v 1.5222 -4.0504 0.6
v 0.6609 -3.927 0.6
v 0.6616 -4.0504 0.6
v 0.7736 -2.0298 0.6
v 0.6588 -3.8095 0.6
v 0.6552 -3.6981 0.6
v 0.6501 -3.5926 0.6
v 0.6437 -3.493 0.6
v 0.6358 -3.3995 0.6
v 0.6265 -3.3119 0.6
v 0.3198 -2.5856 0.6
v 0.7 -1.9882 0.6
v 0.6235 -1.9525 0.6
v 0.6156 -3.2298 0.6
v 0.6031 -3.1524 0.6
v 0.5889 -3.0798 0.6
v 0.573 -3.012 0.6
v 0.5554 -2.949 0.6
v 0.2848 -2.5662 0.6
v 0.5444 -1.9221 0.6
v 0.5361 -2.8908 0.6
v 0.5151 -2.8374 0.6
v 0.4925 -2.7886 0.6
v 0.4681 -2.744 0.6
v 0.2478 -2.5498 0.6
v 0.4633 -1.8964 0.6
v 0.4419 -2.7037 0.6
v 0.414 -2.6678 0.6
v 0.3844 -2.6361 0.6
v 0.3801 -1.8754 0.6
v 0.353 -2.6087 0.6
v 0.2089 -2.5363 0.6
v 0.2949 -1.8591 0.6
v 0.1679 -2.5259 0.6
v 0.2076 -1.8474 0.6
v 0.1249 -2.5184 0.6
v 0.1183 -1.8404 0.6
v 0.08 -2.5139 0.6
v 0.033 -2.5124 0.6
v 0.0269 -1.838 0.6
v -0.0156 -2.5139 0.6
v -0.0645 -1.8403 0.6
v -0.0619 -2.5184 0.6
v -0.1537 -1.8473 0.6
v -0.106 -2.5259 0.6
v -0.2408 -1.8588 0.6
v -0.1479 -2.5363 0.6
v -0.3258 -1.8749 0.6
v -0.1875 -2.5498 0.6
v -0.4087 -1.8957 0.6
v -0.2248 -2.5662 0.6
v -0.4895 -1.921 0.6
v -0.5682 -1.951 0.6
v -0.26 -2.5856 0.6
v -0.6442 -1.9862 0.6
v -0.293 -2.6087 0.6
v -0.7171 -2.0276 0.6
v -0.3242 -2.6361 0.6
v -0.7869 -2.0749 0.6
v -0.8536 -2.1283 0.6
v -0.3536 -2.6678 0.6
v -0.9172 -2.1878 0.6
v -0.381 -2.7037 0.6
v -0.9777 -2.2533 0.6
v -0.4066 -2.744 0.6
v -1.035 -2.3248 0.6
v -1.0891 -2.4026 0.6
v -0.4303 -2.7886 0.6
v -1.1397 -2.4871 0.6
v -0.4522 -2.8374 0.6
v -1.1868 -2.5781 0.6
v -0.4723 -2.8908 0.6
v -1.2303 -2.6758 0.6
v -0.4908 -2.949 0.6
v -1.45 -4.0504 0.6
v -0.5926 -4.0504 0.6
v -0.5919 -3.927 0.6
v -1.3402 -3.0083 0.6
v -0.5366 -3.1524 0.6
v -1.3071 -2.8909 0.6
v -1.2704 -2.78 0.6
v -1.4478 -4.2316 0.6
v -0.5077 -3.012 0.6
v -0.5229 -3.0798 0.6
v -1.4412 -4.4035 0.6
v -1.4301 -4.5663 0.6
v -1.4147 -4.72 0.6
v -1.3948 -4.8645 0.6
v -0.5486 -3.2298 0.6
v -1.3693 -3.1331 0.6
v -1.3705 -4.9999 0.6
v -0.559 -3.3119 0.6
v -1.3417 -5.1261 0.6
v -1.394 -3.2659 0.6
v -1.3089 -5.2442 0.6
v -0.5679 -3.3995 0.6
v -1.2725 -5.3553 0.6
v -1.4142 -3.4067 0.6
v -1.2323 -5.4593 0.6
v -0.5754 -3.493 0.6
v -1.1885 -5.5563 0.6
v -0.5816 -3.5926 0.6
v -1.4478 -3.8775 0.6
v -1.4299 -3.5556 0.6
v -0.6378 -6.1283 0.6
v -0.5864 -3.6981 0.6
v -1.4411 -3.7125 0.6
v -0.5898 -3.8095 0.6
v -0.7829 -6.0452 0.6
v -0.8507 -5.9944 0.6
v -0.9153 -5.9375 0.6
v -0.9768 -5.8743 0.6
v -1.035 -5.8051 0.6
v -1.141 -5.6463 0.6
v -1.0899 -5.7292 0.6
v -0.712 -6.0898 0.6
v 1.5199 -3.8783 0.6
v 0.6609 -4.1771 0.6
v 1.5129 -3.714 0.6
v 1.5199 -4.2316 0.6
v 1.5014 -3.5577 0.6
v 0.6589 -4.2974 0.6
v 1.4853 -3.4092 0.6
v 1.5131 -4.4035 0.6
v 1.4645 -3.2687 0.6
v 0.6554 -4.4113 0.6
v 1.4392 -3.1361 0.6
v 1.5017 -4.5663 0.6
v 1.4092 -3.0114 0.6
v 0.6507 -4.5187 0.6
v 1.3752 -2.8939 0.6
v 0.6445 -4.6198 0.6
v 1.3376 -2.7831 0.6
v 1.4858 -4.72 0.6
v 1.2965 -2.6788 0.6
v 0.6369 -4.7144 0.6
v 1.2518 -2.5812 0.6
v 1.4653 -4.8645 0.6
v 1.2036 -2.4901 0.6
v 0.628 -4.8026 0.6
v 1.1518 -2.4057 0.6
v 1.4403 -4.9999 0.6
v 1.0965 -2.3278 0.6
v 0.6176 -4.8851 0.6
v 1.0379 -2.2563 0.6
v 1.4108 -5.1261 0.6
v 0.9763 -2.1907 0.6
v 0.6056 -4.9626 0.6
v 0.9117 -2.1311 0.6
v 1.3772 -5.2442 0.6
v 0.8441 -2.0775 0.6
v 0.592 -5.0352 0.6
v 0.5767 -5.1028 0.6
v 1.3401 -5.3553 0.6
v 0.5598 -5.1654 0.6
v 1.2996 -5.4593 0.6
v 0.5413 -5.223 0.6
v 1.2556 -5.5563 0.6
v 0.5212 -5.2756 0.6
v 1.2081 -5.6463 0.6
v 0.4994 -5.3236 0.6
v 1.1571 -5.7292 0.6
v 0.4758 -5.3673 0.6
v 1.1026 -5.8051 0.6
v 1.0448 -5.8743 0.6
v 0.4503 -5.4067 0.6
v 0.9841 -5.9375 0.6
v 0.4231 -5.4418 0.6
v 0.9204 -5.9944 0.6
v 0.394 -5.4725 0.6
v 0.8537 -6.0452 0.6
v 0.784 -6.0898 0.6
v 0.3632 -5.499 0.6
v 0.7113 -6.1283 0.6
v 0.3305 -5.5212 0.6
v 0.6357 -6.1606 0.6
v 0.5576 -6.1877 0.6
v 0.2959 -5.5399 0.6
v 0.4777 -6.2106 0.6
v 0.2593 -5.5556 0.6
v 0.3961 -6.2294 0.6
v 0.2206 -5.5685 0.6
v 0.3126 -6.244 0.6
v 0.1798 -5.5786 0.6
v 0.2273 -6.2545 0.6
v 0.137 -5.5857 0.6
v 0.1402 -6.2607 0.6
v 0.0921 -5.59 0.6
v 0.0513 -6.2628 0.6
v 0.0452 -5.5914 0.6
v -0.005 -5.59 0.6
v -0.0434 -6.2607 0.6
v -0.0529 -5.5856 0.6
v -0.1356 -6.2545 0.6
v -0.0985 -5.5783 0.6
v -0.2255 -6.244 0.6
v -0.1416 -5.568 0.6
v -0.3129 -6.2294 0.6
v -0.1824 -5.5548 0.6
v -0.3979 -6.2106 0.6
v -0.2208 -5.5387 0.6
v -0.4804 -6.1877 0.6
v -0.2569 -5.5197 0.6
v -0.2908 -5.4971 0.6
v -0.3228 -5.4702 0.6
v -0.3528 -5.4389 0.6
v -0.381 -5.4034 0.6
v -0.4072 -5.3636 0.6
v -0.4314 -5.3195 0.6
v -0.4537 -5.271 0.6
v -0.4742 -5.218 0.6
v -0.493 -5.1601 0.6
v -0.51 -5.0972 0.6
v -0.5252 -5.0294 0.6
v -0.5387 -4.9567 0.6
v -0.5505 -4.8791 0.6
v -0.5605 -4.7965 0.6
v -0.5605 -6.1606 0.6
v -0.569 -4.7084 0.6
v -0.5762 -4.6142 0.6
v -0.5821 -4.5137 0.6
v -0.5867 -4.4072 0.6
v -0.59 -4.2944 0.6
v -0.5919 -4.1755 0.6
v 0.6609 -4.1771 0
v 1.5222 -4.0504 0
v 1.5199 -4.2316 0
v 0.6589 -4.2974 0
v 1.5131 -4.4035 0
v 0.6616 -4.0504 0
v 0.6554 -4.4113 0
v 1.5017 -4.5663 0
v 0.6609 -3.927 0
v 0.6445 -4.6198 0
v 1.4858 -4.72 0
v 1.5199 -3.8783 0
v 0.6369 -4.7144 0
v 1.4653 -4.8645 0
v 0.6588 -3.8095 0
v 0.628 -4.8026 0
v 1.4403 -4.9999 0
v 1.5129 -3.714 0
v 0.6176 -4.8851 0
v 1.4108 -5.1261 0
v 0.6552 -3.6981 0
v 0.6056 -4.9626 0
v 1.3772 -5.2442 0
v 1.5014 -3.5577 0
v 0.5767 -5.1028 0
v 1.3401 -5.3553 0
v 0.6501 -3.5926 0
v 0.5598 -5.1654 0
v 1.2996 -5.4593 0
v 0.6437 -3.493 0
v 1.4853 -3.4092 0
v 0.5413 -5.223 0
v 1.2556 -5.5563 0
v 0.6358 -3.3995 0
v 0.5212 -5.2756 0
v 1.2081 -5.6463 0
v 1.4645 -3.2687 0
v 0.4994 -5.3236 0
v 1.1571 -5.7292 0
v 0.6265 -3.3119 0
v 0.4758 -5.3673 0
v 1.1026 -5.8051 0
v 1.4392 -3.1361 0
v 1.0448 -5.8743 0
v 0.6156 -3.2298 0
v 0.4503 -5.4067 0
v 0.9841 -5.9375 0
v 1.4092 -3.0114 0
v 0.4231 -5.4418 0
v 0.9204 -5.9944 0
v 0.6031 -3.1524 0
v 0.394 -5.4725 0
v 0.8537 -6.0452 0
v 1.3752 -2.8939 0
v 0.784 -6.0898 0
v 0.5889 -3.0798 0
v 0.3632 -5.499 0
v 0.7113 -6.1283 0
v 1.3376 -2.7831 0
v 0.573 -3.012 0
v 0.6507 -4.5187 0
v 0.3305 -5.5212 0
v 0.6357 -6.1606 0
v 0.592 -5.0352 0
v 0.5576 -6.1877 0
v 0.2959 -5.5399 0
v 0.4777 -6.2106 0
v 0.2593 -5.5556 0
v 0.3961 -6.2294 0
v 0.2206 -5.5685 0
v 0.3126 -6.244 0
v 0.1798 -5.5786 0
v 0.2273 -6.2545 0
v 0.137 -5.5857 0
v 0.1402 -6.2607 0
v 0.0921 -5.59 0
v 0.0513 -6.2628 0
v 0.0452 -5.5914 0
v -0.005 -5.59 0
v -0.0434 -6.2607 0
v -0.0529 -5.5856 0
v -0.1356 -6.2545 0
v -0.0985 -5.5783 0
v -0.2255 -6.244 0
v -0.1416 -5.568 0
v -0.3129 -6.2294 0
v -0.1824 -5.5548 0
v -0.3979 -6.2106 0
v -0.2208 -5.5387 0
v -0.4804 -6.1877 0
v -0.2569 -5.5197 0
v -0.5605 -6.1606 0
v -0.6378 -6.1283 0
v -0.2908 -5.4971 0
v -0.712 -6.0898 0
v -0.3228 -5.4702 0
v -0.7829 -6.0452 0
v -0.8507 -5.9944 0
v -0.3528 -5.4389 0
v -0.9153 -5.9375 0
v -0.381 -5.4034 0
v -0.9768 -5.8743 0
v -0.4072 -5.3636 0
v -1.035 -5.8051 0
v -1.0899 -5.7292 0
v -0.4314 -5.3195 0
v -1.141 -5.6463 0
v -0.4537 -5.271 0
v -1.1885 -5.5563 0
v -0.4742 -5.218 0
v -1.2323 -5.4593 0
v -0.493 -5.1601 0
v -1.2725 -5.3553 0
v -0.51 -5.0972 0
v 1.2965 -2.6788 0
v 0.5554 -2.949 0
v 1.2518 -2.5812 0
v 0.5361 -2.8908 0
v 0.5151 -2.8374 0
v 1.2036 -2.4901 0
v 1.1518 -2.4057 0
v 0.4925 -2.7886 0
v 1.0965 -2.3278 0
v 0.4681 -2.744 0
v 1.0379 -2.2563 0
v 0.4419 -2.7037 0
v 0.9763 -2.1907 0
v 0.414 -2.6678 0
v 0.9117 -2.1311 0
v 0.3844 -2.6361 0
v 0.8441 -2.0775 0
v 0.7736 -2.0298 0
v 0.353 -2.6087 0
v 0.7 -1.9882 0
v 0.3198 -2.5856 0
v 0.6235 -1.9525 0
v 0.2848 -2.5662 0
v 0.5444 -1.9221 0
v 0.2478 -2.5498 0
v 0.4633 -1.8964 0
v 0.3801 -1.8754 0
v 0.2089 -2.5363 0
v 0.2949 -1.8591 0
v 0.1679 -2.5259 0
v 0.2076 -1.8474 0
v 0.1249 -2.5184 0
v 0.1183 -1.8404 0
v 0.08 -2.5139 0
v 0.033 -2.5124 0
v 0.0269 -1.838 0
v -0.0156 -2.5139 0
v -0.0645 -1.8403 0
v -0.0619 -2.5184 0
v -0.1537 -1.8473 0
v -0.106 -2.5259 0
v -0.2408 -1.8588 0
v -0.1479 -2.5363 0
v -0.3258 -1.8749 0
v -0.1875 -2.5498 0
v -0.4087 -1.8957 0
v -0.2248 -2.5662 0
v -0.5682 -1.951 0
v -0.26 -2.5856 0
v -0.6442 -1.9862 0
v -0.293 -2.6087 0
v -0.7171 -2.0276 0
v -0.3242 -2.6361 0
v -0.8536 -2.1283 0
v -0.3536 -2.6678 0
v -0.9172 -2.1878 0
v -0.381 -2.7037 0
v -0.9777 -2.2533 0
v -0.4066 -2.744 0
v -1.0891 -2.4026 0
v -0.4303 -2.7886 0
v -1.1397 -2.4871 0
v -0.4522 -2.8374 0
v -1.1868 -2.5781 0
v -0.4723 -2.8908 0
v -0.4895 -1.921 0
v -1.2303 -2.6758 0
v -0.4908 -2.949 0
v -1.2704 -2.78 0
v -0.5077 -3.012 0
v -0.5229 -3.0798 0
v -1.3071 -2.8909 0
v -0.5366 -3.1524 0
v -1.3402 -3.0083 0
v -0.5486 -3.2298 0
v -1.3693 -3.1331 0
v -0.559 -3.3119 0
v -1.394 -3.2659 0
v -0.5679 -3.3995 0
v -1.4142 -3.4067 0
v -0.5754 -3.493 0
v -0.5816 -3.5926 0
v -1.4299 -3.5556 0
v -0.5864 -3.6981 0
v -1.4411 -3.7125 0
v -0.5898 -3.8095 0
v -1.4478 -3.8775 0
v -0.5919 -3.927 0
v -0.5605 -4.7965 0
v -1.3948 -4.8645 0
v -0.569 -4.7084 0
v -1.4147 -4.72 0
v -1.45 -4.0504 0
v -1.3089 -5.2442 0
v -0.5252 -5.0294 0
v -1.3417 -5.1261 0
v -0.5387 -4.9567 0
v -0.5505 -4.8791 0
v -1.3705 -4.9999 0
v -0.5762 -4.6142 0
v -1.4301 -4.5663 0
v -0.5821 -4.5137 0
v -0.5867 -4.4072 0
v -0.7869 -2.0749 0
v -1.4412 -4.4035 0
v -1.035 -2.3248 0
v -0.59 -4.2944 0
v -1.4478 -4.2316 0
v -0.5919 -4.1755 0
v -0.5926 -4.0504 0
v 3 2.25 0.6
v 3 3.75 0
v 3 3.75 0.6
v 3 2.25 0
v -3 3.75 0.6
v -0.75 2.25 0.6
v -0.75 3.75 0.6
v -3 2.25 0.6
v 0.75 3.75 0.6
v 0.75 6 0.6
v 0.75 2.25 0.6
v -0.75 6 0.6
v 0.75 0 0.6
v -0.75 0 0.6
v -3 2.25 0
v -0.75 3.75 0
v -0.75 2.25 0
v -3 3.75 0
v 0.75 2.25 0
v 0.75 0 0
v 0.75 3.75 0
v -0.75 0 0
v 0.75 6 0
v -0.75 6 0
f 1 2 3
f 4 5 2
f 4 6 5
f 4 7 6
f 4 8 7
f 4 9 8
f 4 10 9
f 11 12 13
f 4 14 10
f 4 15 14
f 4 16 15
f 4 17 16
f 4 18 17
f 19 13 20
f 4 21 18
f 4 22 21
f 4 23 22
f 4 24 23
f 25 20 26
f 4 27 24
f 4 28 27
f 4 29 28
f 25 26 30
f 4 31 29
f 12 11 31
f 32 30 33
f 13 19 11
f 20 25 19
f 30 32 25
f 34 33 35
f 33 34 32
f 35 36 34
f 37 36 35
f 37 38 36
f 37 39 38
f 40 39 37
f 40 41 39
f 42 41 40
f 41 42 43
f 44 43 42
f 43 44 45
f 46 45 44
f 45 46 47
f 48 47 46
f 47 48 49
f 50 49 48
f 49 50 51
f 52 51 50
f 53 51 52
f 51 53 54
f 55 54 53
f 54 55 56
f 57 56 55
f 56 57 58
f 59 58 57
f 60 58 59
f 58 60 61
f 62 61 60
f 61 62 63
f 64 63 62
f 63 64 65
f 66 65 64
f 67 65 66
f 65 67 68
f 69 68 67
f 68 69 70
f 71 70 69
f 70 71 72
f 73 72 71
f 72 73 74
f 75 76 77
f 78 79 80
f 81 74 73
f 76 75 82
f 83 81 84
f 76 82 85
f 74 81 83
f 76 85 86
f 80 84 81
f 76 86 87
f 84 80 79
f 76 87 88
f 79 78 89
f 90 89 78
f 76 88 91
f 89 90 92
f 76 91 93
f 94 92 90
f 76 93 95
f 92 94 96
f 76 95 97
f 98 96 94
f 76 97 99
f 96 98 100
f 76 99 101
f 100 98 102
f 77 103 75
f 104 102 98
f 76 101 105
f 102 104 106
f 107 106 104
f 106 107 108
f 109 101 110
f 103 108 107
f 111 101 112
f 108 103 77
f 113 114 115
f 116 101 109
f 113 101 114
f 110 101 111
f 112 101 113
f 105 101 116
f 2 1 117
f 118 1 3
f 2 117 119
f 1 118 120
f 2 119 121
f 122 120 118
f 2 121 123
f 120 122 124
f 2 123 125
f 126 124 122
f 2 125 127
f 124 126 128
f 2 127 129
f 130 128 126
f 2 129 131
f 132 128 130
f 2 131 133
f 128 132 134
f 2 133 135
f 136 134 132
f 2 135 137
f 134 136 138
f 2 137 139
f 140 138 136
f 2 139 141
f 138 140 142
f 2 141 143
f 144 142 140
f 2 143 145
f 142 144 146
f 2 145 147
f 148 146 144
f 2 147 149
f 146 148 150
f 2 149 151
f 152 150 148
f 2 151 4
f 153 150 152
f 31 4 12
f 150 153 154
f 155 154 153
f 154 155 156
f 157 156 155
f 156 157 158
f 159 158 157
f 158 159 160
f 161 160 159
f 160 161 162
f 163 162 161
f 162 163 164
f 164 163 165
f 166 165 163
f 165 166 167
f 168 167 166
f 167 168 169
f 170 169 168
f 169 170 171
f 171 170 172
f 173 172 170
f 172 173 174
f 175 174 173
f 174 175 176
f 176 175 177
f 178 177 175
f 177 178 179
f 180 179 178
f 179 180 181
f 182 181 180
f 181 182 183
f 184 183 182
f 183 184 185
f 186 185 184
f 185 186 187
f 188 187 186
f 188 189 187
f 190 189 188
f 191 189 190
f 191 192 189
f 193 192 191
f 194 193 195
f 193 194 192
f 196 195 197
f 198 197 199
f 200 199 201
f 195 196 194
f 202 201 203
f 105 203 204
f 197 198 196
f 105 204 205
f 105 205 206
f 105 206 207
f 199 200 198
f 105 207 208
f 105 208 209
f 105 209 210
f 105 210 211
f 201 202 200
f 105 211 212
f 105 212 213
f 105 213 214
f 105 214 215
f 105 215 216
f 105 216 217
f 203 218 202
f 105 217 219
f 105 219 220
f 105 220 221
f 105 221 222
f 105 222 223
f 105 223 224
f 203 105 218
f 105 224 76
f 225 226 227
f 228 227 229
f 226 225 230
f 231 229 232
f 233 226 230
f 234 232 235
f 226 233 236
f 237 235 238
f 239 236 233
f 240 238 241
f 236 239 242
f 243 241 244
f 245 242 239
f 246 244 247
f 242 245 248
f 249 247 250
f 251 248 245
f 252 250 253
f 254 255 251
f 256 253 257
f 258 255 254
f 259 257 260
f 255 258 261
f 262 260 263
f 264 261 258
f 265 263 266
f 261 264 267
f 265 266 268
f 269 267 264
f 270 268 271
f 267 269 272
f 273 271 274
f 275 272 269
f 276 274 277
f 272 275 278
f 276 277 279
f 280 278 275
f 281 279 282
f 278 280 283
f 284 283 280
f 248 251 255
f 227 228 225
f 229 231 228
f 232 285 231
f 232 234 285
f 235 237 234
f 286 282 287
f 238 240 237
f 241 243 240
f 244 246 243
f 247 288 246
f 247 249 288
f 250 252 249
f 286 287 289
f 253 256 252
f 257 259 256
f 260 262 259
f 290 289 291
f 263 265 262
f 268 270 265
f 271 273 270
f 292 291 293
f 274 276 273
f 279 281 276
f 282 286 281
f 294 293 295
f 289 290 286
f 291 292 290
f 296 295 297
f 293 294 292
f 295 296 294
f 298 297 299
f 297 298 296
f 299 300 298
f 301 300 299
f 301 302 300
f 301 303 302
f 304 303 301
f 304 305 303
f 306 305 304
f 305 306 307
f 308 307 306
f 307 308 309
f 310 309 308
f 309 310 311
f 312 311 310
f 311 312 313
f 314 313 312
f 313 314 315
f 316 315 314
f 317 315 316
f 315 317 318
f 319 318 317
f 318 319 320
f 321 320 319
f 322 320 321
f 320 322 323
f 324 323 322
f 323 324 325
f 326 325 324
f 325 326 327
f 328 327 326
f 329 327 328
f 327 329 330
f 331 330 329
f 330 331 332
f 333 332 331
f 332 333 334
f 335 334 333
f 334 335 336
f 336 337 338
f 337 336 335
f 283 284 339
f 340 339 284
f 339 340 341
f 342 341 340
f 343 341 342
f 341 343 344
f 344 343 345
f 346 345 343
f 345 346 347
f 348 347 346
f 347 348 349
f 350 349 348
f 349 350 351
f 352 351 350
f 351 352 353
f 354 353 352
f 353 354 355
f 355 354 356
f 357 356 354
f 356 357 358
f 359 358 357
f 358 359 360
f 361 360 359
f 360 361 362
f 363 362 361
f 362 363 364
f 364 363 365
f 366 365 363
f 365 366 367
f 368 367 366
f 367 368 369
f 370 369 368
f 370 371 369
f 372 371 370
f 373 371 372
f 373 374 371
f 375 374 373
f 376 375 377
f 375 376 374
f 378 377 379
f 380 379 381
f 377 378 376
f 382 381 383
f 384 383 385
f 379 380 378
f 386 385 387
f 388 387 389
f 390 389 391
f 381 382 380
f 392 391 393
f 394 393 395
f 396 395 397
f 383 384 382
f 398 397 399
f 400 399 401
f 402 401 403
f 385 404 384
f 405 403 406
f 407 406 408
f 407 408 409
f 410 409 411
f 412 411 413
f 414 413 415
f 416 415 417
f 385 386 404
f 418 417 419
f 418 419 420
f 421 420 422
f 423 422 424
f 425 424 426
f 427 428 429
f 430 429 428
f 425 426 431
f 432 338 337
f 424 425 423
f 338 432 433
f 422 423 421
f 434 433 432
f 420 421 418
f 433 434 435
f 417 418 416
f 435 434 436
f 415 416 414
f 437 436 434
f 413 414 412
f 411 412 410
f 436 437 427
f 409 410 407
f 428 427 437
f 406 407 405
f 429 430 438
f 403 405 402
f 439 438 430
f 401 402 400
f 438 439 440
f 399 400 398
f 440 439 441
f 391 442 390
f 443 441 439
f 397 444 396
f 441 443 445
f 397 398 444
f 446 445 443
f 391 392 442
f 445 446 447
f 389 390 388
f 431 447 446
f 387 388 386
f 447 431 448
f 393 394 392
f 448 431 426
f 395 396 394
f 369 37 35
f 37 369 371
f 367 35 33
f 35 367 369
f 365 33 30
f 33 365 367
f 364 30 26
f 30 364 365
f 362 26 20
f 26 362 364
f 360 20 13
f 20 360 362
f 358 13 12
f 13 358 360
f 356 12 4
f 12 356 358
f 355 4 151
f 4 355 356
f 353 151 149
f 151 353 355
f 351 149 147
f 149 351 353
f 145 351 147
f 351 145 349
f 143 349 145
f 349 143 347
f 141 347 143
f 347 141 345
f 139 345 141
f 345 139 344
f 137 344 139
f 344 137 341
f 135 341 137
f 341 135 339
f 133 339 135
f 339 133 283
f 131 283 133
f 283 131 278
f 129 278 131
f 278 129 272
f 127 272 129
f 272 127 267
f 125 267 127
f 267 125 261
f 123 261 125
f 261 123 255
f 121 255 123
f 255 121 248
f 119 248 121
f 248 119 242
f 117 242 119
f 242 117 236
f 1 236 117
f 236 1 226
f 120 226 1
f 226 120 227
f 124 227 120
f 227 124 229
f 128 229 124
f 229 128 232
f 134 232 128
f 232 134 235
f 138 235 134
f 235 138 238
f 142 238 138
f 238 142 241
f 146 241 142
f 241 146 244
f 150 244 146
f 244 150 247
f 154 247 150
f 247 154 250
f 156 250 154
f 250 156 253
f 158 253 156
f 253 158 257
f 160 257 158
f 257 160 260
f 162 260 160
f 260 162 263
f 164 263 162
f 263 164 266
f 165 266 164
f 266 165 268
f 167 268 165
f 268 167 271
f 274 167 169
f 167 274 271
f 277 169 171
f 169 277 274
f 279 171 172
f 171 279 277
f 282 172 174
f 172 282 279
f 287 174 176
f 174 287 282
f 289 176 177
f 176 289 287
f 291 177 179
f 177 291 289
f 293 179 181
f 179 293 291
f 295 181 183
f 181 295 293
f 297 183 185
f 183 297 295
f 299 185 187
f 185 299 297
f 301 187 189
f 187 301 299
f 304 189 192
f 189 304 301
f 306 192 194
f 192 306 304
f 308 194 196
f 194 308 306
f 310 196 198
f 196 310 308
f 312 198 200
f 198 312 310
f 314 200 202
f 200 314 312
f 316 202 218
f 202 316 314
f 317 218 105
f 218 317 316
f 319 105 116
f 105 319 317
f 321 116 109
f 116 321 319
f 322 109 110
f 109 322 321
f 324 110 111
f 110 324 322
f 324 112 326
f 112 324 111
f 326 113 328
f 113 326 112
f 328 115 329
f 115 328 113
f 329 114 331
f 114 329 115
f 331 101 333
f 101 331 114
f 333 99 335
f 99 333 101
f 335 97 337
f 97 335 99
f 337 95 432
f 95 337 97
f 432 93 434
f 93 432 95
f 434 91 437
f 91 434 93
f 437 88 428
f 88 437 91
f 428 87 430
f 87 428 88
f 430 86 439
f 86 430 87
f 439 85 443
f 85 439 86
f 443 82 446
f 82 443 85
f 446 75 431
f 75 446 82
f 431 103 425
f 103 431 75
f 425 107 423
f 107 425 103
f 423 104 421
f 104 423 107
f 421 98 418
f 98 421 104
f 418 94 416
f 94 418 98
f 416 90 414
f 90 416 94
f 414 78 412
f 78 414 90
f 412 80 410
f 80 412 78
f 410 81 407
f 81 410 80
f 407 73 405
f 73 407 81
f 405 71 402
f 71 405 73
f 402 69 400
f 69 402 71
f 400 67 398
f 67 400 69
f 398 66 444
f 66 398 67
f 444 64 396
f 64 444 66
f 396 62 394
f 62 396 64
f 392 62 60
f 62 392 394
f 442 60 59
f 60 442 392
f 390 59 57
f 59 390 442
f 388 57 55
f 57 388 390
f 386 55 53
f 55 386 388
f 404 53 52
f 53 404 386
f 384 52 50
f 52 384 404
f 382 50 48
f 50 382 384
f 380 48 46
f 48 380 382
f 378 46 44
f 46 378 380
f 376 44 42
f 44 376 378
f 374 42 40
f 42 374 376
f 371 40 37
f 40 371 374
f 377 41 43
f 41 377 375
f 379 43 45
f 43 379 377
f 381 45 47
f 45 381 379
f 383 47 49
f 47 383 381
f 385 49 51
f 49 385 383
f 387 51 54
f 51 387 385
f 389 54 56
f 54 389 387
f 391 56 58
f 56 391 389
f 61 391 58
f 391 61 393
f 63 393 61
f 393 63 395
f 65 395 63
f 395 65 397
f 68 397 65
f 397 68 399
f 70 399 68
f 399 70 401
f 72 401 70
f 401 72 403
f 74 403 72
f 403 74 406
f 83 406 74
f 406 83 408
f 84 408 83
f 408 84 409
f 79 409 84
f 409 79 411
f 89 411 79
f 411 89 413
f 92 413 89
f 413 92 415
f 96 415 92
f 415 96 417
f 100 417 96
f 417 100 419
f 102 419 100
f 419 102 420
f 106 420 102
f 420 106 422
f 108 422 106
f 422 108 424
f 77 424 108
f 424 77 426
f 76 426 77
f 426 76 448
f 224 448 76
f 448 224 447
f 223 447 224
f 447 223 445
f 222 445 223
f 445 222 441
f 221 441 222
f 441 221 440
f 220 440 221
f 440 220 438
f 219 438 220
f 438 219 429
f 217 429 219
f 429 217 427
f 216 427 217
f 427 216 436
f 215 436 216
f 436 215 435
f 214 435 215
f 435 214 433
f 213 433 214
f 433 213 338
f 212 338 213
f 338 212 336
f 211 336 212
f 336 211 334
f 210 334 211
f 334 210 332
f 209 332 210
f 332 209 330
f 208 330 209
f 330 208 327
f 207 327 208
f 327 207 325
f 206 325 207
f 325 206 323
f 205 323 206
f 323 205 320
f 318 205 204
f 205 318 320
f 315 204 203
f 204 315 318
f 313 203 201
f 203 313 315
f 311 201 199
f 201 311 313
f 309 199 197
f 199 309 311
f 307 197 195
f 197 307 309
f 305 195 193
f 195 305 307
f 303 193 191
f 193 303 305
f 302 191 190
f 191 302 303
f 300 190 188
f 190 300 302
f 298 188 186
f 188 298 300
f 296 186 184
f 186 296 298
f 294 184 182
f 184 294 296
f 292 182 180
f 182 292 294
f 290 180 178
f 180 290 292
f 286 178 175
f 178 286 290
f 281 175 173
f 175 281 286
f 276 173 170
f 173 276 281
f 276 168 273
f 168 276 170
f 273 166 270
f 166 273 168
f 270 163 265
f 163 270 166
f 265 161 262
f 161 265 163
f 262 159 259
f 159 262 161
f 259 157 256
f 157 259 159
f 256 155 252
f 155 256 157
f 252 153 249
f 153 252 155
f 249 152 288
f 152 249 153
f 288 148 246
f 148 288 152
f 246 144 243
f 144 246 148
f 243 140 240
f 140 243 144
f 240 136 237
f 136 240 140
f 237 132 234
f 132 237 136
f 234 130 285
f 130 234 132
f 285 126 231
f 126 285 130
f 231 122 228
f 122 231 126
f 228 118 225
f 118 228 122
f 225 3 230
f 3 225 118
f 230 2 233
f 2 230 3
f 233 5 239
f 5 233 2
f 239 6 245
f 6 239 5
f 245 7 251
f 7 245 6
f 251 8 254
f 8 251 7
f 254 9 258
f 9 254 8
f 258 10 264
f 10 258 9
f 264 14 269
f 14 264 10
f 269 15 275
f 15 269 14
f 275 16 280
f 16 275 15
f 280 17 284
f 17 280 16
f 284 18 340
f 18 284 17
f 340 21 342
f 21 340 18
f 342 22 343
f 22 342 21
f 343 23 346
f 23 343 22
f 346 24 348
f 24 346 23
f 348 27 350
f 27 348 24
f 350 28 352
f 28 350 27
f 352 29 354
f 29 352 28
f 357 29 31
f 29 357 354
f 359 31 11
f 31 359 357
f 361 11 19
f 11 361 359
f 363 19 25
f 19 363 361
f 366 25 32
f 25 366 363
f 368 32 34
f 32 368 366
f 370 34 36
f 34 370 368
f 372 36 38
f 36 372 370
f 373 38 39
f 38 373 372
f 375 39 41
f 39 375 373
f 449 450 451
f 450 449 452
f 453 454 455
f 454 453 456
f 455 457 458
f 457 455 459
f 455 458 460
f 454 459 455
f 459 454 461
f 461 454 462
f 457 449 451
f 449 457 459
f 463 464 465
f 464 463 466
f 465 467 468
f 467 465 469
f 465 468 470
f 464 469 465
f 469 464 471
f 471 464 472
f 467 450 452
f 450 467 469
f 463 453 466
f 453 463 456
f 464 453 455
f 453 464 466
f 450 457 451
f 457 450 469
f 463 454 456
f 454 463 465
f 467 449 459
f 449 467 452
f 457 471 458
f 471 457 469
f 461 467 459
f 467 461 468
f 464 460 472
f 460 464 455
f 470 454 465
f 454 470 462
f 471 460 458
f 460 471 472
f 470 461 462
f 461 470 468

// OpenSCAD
$fn = 50;

difference() {
	union() {
		translate(v = [0.0, -4.0, 0.6]) {
			rotate(a = [180, 0, 0]) {
				linear_extrude(height = 0.6) {
					text(font = "Liberation Sans:style=Bold", halign = "center", size = 4.5, text = "0", valign = "center");
				}
			}
		}
		translate(v = [-3.0, 2.25, 0]) {
			cube(size = [6, 1.5, 0.6]);
		}
		translate(v = [-0.75, 0.0, 0]) {
			cube(size = [1.5, 6, 0.6]);
		}
	}
	union();
}
